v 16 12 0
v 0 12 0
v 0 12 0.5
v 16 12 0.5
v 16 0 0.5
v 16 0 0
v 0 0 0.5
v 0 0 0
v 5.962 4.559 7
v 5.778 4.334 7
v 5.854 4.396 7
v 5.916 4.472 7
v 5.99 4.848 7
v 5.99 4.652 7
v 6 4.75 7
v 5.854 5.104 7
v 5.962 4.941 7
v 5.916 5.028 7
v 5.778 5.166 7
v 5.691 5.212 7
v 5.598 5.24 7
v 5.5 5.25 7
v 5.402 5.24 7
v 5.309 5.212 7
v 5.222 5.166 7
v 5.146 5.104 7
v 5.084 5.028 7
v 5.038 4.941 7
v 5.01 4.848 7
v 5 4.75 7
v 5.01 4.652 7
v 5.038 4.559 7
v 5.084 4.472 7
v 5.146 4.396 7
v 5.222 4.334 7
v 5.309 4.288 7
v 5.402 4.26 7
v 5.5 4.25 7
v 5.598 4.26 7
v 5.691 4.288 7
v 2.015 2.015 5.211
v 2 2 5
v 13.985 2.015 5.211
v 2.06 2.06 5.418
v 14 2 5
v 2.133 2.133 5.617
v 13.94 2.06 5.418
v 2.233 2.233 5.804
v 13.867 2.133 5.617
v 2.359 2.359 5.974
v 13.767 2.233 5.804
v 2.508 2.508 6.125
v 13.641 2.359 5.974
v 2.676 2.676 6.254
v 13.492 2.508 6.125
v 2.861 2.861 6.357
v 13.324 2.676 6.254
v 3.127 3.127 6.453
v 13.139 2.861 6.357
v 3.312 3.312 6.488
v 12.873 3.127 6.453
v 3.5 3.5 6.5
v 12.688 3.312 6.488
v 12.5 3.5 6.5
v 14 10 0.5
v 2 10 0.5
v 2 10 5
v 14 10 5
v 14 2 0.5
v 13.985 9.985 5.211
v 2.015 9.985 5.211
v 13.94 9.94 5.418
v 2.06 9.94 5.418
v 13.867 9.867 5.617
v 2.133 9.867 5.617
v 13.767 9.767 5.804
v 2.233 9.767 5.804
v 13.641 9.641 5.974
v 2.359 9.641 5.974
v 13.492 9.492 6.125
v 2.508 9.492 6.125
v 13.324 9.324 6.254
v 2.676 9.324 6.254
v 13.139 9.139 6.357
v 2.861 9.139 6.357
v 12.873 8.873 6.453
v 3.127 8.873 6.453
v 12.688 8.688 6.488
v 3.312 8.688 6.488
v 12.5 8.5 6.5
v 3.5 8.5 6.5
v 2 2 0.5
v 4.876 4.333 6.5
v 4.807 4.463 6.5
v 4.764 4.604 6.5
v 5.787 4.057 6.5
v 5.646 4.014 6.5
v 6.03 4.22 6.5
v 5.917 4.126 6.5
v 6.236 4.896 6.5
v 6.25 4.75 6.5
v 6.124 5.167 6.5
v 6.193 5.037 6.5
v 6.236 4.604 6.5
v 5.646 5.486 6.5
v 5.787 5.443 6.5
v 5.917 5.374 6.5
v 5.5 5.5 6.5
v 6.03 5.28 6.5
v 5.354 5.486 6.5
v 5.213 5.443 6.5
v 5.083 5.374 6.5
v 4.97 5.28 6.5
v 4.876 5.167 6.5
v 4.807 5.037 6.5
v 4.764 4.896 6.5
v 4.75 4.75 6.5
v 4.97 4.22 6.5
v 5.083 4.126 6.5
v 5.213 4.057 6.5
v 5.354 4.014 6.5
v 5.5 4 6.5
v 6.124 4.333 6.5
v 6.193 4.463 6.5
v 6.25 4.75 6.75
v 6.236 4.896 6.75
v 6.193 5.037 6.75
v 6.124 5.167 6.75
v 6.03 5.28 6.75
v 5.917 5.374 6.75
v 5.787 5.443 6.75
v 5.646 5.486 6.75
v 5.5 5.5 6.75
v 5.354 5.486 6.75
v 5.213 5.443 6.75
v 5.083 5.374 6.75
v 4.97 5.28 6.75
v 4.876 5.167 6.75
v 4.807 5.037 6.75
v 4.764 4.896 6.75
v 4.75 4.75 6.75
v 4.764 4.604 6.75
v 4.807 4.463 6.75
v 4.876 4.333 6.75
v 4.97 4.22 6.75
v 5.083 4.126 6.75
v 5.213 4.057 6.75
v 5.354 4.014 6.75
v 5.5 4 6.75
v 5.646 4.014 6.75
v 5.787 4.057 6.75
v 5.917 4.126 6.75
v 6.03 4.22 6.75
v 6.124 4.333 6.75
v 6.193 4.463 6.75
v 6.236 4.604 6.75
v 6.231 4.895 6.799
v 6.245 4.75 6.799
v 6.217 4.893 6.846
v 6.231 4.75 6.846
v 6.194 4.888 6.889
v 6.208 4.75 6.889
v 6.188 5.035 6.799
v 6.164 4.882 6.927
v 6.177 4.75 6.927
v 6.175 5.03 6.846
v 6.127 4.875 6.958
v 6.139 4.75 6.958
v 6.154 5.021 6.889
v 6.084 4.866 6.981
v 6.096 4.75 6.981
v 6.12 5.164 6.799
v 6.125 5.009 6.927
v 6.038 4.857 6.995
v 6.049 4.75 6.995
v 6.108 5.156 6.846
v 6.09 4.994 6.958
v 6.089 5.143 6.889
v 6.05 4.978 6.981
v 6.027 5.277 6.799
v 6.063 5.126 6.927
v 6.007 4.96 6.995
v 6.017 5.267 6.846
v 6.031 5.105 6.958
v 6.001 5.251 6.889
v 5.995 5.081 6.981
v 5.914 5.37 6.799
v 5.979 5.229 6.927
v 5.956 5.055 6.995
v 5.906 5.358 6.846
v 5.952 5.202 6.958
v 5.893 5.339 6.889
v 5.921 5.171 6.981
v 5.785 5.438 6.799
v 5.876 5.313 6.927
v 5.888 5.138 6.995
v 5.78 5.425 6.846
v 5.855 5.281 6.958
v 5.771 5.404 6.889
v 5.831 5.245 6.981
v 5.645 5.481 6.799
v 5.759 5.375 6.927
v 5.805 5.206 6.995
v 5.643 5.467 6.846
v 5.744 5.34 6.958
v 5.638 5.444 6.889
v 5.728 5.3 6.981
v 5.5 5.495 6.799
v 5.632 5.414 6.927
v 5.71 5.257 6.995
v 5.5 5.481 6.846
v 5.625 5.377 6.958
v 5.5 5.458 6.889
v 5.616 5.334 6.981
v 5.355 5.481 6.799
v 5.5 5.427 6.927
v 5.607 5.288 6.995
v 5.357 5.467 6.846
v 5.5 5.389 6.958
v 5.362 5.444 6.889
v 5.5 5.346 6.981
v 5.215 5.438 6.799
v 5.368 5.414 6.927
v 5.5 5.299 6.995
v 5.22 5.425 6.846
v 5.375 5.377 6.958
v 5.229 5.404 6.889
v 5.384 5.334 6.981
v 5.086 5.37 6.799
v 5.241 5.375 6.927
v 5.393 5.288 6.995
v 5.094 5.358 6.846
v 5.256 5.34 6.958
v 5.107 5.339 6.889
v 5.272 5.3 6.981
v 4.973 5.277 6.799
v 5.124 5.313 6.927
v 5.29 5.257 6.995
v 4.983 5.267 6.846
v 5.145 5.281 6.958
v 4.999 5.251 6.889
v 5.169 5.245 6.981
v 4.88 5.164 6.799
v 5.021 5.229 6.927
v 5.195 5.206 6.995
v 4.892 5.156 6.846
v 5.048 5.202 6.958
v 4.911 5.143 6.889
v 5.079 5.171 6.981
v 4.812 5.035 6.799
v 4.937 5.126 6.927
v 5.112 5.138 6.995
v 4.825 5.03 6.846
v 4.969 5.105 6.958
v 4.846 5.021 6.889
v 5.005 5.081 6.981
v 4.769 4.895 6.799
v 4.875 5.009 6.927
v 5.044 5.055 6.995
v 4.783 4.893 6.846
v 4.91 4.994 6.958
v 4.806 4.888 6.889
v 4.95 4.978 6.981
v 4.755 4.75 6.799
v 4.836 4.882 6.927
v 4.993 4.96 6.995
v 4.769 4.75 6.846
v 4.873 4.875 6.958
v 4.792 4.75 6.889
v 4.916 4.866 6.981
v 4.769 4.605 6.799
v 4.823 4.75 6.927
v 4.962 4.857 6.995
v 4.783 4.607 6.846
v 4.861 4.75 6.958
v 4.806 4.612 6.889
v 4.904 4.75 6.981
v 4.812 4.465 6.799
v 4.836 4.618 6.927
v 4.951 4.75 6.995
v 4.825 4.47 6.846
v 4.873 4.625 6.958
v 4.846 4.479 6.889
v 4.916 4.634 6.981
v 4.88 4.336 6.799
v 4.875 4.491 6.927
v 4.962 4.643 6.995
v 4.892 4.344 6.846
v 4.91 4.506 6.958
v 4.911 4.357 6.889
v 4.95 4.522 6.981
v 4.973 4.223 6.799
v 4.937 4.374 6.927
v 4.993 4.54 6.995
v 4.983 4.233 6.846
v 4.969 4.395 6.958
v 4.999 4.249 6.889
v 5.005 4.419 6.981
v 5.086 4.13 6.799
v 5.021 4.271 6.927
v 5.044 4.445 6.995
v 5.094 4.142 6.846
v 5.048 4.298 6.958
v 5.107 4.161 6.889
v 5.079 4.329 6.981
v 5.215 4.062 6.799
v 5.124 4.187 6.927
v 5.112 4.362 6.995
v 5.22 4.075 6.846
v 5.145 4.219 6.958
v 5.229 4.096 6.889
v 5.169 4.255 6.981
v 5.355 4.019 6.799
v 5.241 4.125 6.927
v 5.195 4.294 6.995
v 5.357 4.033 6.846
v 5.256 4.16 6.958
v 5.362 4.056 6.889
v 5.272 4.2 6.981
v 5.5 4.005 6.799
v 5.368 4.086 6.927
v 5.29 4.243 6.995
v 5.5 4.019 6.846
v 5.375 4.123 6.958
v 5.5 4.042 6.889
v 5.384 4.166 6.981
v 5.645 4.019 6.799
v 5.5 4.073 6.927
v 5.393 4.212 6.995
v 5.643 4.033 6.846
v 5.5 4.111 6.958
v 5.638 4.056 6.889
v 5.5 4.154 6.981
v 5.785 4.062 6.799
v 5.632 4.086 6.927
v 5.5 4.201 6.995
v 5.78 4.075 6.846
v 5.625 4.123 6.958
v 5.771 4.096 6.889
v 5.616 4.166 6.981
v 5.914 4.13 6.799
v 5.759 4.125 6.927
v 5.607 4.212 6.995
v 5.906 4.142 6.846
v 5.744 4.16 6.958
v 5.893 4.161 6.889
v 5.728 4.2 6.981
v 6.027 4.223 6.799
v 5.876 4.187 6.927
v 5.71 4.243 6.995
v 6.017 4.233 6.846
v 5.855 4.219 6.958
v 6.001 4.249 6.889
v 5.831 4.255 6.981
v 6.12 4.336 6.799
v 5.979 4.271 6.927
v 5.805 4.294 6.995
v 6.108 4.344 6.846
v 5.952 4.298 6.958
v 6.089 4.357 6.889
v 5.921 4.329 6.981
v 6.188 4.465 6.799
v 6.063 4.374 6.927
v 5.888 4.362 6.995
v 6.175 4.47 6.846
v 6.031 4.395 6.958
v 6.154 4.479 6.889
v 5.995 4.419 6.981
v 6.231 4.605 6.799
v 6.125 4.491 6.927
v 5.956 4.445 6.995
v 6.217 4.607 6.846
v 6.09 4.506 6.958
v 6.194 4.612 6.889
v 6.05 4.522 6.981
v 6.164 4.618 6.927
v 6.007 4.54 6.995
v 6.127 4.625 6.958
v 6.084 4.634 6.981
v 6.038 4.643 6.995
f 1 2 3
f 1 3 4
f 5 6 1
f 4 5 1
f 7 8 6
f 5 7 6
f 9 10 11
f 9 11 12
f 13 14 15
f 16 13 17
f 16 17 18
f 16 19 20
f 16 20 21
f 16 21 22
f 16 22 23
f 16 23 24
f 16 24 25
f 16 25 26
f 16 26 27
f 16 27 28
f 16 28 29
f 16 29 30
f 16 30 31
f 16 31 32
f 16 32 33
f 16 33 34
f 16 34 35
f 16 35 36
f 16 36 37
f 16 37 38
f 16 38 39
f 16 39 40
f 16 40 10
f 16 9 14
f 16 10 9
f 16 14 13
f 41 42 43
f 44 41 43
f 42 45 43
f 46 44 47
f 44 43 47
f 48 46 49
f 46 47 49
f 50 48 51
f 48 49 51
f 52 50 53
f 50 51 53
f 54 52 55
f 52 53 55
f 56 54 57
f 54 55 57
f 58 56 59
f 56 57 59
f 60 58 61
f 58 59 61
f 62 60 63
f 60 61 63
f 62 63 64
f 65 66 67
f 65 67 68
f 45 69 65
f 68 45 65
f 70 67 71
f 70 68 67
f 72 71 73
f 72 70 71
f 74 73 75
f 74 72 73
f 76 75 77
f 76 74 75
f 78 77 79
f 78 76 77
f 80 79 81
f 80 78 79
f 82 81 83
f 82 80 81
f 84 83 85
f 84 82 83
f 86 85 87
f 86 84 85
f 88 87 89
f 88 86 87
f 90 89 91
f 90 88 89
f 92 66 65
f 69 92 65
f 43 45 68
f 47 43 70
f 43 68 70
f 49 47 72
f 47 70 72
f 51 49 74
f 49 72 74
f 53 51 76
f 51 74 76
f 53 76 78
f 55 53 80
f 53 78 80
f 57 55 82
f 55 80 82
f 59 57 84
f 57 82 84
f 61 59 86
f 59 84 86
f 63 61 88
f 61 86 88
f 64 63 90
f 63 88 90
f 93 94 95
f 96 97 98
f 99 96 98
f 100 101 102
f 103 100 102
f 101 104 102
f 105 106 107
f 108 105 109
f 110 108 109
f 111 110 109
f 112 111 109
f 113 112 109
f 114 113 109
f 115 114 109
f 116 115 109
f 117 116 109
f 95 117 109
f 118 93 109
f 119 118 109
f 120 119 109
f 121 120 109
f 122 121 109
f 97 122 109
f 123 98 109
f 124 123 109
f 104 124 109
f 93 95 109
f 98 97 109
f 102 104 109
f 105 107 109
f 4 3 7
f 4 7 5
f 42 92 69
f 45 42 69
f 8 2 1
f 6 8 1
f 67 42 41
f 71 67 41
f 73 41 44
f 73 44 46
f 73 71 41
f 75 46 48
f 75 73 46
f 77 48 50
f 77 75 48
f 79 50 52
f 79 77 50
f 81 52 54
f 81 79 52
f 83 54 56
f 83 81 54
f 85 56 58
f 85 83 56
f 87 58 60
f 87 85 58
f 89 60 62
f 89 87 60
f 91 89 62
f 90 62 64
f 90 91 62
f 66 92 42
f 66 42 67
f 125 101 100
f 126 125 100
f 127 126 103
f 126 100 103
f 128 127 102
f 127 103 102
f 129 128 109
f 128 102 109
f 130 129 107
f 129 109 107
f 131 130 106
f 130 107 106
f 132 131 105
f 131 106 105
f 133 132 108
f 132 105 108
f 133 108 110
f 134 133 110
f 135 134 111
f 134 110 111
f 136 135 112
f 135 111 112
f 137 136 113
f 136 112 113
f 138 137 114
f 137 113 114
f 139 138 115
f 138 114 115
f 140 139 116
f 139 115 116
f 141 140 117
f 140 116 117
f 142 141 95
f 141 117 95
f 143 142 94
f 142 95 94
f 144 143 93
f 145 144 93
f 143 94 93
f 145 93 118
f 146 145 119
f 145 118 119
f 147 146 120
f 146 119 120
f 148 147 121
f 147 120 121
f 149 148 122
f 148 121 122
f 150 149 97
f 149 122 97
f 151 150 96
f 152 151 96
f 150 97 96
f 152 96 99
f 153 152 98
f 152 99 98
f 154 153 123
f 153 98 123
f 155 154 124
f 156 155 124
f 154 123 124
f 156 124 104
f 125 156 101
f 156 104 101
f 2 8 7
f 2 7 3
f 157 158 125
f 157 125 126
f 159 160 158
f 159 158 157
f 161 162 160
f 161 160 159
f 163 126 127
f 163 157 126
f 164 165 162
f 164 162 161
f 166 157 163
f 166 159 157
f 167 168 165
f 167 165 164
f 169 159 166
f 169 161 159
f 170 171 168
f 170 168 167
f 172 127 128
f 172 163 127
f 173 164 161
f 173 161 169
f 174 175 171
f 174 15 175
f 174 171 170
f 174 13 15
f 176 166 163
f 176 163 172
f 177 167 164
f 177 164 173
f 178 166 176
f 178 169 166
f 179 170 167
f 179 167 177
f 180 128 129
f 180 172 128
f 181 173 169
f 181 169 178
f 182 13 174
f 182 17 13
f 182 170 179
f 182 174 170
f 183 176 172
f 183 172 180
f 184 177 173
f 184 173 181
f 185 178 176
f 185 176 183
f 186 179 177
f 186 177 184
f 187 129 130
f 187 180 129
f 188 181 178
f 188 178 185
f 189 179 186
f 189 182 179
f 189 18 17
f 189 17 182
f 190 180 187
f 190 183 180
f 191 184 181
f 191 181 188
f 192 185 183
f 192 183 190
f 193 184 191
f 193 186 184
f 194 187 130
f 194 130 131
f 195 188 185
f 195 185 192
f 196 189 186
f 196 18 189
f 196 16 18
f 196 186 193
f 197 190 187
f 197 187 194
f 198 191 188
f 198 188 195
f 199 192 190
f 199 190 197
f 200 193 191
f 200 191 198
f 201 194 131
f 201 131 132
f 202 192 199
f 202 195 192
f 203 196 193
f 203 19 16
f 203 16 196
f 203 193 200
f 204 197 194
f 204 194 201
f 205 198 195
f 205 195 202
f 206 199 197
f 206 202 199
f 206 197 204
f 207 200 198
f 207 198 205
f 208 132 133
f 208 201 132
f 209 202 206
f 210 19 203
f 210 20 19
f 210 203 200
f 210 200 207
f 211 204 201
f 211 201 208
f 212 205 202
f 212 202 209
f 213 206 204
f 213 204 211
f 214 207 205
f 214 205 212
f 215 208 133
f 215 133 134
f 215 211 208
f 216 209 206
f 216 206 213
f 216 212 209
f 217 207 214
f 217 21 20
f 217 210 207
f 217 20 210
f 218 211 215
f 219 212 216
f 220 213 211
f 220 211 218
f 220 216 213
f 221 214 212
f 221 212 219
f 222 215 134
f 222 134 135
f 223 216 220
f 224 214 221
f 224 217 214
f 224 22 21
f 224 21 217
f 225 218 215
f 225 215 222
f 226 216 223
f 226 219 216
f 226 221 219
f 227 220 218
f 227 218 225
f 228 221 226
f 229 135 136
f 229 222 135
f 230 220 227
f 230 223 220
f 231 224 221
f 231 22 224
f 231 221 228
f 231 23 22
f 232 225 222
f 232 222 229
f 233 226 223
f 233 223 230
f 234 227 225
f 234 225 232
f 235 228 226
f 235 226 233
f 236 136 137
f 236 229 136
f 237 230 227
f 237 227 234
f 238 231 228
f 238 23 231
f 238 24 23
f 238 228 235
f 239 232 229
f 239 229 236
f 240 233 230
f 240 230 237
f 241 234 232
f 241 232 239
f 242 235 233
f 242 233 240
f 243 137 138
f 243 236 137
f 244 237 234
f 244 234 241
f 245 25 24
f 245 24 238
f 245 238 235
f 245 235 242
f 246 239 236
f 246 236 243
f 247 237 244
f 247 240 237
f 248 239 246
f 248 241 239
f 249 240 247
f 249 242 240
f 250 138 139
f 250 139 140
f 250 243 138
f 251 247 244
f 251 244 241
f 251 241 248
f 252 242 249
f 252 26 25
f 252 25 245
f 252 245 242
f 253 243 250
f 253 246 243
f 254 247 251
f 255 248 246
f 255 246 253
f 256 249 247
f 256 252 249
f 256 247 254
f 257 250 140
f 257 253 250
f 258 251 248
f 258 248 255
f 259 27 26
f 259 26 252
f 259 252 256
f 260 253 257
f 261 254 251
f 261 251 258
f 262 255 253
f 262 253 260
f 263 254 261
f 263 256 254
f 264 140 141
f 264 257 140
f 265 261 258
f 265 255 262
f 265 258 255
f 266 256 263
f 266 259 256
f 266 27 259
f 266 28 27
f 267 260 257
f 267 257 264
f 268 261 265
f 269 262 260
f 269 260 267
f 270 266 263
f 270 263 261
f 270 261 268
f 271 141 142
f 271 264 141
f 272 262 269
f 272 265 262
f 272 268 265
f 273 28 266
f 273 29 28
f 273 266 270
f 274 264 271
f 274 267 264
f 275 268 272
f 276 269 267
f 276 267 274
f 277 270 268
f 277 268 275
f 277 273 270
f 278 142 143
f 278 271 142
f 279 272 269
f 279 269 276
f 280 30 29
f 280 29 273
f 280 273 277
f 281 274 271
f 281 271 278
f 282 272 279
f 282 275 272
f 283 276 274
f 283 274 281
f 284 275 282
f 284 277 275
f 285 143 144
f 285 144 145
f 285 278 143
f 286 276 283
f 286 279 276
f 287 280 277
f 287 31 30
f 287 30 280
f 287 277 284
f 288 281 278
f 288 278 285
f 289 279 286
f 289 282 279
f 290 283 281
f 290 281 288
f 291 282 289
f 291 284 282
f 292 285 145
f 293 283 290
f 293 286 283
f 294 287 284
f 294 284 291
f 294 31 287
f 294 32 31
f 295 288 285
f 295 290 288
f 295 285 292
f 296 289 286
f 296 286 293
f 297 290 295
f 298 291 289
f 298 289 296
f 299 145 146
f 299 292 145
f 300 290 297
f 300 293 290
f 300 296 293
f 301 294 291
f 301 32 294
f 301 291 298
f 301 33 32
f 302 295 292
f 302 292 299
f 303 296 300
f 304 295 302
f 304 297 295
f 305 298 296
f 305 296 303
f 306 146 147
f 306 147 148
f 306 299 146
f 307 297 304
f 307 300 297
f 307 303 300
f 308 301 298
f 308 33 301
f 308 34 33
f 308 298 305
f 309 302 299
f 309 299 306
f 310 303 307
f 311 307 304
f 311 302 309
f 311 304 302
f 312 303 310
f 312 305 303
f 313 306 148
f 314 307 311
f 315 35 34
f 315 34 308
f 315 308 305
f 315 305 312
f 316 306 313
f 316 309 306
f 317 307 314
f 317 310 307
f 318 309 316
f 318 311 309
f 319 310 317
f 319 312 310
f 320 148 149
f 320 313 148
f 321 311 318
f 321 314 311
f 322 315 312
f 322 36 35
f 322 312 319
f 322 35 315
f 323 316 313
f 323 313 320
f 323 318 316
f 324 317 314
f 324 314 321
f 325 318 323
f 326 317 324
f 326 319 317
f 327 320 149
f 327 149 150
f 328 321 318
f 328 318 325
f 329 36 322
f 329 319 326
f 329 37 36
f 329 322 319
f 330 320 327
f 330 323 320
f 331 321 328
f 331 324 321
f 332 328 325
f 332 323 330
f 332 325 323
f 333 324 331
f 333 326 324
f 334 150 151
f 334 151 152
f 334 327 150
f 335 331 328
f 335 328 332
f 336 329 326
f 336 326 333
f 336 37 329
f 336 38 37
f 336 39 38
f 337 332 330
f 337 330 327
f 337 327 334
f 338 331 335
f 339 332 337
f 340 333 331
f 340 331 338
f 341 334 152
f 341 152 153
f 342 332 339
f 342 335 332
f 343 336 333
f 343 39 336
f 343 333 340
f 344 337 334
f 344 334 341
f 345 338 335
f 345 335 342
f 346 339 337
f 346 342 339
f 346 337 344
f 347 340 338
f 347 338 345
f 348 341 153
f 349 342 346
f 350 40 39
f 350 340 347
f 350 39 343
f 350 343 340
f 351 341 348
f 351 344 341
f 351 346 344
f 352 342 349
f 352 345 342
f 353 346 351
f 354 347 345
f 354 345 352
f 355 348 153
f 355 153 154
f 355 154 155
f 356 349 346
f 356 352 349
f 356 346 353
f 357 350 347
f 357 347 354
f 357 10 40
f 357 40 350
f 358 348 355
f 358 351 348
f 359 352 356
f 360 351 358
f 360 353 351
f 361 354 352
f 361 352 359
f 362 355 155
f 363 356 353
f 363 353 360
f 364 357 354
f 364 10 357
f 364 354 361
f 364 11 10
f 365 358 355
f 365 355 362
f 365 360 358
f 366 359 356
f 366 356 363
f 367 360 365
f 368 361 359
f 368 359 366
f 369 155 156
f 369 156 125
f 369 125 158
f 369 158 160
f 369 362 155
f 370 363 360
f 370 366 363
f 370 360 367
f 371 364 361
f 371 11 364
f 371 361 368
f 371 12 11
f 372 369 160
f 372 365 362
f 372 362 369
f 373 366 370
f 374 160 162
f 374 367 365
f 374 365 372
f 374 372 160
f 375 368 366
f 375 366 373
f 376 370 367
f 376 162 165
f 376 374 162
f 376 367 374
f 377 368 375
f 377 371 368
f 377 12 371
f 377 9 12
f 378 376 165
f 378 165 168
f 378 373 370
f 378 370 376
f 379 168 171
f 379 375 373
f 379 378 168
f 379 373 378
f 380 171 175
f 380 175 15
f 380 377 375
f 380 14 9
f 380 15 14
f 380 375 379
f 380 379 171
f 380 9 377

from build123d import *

# Parameters (mm, degrees)
SKETCH_W     = 16
SKETCH_H     = 12
PAD_DEPTH    = 0.5
SKETCH001_W  = 12
SKETCH001_H  = 8
PAD001_DEPTH = 6
FILLET_R     = 1.5
SKETCH002_R  = 0.75
PAD002_DEPTH = 0.5
FILLET001_R  = 0.25


with BuildPart() as pad:
    # Sketch → Pad (new body)
    with BuildSketch(Plane.XY):
        with Locations((8, 6)):
            Rectangle(SKETCH_W, SKETCH_H)
    extrude(amount=PAD_DEPTH)


with BuildPart() as fillet_body:
    # Sketch001 → Pad001 (new body)
    with BuildSketch(Plane.XY.offset(0.5)):
        with Locations((8, 6)):
            Rectangle(SKETCH001_W, SKETCH001_H)
    extrude(amount=PAD001_DEPTH)

    # Fillet
    fillet_edges = [fillet_body.edges().sort_by_distance(p)[0] for p in [
        (8, 2, 6.5),
        (14, 6, 6.5),
        (8, 10, 6.5),
        (2, 6, 6.5),
    ]]
    fillet(fillet_edges, radius=FILLET_R)


with BuildPart() as fillet001:
    # Sketch002 → Pad002 (new body)
    with BuildSketch(Plane.XY.offset(6.5)):
        with Locations((5.5, 4.75)):
            Circle(SKETCH002_R)
    extrude(amount=PAD002_DEPTH)

    # Fillet001
    fillet001_edges = [fillet001.edges().sort_by_distance(p)[0] for p in [
        (4.75, 4.75, 7),
    ]]
    fillet(fillet001_edges, radius=FILLET001_R)


solid = Compound([pad.part, fillet_body.part, fillet001.part])
